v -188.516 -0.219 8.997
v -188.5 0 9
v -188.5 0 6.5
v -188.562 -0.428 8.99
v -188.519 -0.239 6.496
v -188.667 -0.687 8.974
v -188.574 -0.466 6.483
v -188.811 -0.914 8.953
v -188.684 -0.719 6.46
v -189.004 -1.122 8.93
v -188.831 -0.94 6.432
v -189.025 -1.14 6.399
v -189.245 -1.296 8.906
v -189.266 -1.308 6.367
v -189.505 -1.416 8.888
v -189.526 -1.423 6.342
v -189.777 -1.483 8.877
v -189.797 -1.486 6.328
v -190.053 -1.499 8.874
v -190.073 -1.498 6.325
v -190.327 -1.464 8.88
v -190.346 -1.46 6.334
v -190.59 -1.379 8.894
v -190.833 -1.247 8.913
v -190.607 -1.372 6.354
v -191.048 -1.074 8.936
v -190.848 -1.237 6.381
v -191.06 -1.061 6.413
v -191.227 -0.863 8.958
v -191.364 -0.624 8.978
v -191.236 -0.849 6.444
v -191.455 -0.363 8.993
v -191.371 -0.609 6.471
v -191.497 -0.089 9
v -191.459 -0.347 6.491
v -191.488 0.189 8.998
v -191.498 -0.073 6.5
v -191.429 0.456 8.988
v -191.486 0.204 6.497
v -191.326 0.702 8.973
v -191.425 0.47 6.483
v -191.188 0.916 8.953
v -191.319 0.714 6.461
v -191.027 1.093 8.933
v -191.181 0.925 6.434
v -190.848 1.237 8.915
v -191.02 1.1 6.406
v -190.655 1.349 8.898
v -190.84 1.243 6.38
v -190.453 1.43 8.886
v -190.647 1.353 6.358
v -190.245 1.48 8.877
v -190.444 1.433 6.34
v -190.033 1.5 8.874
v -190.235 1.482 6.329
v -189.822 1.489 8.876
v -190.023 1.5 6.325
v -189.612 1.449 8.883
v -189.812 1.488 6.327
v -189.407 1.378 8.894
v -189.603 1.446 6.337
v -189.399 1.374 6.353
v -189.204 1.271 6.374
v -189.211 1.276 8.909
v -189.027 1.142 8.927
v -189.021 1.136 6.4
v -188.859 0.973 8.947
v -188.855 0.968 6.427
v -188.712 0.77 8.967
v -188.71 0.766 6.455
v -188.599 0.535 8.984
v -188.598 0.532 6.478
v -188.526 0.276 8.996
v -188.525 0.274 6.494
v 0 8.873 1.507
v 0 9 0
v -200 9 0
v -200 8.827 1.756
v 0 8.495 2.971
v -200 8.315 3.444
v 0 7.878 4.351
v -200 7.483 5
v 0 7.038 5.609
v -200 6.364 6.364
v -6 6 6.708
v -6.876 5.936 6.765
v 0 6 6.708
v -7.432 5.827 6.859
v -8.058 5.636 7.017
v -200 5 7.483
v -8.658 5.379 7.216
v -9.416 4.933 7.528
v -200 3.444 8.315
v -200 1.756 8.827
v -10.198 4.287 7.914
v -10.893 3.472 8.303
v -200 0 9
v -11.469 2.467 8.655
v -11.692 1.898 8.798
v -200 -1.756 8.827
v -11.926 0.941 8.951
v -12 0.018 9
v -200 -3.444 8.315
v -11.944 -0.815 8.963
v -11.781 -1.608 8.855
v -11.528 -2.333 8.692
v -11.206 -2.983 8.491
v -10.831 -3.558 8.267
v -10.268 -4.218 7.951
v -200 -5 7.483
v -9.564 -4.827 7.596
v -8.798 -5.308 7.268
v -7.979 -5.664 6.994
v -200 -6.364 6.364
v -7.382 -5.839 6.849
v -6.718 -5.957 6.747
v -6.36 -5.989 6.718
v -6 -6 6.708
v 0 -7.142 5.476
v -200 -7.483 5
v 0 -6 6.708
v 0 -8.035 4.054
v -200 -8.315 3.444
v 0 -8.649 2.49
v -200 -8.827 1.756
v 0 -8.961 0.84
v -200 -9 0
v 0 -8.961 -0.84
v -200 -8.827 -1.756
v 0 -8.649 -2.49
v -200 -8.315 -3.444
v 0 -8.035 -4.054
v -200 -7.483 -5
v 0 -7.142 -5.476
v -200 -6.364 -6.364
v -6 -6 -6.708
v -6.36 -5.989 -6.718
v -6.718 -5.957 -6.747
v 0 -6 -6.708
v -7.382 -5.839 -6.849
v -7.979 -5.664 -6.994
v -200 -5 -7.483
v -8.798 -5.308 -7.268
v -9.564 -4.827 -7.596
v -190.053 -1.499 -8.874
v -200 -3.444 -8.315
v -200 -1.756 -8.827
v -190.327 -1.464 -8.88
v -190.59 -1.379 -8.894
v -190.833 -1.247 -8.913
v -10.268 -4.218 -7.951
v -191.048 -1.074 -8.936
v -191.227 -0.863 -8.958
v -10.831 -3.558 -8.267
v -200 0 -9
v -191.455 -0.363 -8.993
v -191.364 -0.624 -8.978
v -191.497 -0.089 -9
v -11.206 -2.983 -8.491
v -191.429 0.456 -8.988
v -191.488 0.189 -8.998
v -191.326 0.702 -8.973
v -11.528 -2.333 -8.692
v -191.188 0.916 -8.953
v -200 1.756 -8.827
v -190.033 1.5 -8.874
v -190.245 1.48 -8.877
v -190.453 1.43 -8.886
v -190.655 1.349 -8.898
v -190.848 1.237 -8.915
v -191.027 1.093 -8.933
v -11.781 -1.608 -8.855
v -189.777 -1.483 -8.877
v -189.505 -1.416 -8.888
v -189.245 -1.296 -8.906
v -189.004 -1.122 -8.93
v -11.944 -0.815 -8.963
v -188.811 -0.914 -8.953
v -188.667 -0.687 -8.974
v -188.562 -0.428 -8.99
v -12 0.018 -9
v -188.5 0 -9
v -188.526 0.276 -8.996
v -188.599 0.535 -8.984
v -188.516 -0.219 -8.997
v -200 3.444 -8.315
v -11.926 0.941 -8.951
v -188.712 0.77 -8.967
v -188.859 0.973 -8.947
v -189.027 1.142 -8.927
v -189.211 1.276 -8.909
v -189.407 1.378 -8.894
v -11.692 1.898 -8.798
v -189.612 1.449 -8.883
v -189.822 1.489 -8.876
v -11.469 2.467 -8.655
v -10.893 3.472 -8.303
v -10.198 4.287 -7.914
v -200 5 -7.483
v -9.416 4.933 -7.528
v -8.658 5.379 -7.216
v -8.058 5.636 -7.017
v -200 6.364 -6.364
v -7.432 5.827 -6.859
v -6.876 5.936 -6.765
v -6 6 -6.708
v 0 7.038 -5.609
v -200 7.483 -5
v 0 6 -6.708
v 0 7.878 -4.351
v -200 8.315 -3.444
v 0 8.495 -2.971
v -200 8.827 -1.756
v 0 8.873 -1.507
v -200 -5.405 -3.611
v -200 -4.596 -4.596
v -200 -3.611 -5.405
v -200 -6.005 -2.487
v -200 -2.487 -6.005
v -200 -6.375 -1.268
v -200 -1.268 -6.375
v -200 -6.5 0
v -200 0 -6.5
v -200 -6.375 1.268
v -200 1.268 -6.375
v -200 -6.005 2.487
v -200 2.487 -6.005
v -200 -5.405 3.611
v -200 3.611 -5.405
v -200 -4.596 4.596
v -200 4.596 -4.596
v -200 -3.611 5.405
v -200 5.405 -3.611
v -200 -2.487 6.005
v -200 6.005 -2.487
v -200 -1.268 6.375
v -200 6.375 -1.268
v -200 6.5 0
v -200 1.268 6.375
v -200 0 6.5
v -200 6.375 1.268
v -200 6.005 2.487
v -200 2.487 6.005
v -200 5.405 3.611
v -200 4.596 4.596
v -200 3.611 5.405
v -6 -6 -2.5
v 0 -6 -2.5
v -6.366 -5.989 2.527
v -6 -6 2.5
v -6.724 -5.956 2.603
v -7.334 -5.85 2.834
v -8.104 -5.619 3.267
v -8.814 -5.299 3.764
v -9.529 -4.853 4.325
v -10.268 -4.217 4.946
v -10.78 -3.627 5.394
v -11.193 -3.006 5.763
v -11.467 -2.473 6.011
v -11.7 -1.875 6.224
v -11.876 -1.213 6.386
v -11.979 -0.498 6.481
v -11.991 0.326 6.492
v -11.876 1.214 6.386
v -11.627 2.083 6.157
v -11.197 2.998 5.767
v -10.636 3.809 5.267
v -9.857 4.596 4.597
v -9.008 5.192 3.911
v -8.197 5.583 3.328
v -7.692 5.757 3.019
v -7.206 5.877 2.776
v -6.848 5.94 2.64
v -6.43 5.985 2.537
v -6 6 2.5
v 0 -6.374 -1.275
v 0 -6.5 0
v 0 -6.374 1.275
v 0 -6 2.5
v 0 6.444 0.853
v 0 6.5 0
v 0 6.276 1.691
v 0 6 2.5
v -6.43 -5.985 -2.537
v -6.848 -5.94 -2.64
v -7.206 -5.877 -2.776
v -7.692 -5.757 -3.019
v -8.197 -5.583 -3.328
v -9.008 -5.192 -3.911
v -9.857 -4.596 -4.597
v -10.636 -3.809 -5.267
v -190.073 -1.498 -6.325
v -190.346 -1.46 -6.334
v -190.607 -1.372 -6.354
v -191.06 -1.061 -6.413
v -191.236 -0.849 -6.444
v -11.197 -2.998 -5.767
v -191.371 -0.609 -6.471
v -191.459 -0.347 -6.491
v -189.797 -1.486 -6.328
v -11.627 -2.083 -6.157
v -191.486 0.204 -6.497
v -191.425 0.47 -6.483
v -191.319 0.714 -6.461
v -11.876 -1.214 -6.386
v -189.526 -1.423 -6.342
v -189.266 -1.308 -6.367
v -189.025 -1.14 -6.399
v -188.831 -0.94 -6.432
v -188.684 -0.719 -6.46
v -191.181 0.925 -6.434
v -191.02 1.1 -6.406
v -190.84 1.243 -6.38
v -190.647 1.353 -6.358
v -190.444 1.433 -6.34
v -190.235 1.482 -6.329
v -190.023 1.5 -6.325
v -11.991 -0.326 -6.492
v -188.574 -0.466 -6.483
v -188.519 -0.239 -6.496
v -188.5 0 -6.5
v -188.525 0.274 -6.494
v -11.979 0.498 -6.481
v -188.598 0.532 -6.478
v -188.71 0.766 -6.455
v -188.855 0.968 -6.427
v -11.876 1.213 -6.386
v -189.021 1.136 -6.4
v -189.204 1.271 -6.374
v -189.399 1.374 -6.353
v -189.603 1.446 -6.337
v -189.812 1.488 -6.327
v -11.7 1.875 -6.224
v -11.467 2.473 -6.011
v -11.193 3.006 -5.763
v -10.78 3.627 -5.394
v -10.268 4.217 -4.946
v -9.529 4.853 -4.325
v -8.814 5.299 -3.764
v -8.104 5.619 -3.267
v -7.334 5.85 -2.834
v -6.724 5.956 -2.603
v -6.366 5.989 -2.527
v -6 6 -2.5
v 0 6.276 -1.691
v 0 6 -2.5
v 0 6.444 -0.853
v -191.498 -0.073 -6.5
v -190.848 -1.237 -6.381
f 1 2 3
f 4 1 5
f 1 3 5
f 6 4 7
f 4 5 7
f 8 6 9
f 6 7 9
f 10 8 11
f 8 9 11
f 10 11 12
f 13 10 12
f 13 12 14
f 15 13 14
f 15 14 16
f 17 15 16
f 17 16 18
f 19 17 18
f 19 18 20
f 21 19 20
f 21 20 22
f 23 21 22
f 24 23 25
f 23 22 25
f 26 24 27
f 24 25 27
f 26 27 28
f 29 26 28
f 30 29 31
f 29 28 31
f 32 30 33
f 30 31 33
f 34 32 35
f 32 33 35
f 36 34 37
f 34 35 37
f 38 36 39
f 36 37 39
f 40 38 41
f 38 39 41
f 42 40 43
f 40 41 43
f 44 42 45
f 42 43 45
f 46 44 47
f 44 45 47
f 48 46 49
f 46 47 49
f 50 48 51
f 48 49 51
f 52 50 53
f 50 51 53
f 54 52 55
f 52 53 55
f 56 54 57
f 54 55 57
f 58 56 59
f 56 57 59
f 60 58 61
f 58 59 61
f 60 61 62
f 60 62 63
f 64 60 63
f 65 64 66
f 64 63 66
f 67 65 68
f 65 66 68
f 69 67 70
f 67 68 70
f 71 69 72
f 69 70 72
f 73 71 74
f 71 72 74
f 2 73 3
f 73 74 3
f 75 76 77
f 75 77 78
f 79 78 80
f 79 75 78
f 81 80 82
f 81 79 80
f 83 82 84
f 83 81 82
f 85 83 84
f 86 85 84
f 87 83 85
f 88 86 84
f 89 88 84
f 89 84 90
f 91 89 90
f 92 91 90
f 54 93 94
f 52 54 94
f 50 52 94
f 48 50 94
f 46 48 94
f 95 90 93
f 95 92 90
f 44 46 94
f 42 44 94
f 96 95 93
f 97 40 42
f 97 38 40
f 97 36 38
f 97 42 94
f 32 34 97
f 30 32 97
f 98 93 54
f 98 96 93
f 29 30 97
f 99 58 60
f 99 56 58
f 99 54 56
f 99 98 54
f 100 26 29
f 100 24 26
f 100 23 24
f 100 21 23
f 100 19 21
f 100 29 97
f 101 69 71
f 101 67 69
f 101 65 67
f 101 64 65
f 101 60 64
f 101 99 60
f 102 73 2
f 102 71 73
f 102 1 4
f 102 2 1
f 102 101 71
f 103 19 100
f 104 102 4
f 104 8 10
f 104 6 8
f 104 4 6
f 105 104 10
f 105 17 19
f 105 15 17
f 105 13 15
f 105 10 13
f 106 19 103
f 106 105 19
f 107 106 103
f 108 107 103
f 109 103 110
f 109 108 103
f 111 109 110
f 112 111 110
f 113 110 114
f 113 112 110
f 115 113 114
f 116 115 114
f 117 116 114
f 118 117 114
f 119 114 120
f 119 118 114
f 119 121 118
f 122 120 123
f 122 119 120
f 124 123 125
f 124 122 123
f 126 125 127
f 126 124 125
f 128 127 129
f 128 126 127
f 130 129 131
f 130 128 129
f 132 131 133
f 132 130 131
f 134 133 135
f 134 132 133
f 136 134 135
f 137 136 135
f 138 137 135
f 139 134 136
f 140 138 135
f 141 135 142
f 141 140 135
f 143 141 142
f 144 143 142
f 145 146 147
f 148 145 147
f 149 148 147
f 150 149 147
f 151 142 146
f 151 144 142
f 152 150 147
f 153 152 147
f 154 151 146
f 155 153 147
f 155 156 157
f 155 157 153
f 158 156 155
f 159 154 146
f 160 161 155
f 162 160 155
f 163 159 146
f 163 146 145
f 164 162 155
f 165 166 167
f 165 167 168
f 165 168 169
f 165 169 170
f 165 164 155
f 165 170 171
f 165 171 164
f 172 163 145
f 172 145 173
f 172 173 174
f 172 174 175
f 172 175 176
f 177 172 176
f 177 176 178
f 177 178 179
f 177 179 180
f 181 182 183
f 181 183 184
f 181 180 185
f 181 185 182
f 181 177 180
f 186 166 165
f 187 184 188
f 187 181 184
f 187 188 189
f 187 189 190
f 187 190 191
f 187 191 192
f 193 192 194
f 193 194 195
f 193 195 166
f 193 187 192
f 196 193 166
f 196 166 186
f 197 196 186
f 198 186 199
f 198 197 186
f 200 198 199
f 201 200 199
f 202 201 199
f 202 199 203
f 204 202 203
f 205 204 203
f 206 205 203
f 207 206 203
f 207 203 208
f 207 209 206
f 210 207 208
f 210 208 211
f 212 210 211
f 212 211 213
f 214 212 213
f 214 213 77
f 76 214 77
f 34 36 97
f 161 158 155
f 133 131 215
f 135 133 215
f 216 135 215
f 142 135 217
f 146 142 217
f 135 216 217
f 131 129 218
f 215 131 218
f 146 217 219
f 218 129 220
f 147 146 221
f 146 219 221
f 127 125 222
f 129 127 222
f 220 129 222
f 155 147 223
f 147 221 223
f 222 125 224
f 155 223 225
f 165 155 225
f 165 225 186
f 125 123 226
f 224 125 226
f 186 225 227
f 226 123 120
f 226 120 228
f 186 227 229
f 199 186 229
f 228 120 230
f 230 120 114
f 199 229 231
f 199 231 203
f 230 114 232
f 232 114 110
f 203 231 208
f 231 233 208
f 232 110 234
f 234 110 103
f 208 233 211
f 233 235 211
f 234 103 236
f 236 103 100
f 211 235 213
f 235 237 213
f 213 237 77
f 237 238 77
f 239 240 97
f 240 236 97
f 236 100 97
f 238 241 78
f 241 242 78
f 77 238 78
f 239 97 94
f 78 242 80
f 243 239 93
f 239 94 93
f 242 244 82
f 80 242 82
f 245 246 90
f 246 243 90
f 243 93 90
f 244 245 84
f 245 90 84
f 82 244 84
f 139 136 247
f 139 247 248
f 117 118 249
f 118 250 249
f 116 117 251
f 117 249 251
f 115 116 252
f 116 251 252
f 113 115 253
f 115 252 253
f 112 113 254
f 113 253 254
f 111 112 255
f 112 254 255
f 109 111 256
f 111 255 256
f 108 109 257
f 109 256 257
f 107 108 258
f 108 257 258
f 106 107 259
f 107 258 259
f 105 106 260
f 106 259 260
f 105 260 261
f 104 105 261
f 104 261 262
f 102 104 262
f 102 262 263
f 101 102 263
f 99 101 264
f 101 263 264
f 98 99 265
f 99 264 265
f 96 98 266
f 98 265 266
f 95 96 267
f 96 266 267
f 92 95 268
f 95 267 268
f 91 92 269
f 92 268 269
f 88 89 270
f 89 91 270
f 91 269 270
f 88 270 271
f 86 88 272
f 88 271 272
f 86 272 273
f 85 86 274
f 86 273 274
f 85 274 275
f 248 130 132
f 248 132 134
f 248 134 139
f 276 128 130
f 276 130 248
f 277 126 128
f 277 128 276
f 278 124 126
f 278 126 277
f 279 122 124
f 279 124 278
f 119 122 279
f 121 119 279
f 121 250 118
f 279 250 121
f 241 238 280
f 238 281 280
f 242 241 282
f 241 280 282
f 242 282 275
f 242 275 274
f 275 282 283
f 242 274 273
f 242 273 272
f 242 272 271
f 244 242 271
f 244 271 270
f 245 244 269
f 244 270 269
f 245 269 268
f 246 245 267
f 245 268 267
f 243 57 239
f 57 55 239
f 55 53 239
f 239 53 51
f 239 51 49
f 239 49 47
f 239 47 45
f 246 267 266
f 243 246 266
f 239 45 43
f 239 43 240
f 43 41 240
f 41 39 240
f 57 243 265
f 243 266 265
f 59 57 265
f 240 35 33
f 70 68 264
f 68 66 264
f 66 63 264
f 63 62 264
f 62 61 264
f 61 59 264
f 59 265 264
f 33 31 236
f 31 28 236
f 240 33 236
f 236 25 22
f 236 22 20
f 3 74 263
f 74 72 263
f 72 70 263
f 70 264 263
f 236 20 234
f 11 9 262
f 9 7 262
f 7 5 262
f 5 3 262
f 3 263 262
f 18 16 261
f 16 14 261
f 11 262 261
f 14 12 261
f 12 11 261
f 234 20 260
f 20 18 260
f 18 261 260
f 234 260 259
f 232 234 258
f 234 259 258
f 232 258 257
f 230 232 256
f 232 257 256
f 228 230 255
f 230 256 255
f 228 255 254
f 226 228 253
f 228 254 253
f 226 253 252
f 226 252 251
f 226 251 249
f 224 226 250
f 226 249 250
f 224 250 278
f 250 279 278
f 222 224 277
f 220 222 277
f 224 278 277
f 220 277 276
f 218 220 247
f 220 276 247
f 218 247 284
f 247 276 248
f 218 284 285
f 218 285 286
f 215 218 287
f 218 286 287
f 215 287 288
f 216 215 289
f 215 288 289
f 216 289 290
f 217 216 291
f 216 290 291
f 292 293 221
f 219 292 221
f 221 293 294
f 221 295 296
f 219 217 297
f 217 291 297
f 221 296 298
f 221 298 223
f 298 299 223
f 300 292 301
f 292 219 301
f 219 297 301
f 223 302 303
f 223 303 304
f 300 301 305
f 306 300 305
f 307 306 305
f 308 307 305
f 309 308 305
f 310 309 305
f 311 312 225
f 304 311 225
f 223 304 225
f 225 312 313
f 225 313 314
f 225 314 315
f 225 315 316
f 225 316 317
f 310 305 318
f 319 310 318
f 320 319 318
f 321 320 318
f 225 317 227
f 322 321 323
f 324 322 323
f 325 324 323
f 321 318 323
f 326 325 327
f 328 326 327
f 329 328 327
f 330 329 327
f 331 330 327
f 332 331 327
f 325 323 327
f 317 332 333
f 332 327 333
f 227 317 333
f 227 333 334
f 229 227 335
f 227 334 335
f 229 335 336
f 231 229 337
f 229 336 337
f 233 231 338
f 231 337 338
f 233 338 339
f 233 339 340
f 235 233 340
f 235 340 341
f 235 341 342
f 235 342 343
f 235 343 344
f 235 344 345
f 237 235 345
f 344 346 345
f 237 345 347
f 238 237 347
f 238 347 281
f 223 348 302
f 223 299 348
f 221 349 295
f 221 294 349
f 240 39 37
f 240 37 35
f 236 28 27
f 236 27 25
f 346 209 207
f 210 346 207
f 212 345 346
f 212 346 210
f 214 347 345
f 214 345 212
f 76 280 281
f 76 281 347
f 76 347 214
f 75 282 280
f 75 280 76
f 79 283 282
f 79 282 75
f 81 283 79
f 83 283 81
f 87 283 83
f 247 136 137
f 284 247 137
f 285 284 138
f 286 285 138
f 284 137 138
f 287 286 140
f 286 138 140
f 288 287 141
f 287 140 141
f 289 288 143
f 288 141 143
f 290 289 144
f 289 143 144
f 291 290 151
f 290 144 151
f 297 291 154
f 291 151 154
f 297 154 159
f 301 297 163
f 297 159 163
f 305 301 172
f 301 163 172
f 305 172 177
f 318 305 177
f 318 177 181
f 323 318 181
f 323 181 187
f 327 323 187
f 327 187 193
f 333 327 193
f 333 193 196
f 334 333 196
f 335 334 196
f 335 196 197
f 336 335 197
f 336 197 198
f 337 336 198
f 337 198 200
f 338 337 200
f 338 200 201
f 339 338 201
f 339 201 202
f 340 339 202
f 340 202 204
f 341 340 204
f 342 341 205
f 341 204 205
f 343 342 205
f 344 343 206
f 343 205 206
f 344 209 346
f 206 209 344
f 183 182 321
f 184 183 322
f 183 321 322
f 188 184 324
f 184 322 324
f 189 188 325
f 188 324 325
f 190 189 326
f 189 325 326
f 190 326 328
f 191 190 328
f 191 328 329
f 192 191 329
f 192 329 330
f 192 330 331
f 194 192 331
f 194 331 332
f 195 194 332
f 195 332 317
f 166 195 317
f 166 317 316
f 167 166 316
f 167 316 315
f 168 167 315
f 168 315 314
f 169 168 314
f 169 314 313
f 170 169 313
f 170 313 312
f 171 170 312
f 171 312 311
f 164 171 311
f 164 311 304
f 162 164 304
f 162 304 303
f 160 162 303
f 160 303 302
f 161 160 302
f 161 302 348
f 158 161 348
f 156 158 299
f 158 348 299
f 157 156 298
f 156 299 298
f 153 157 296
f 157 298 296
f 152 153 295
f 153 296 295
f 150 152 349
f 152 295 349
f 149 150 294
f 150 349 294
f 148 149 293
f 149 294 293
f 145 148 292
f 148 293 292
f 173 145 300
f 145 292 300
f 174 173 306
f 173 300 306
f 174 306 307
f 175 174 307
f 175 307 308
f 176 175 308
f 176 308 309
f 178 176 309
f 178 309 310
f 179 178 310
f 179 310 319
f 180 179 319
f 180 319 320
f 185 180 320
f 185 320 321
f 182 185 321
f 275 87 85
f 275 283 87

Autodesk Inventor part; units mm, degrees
ref_plane "YZ Plane" through (0, 0, 0) normal (1, 0, 0) x (0, 1, 0)
ref_plane "XZ Plane" through (0, 0, 0) normal (0, 1, 0) x (-1, 0, 0)
ref_plane "XY Plane" through (0, 0, 0) normal (0, 0, 1) x (1, 0, 0)
sketch "スケッチ1" plane through (0, 0, 0) normal (1, 0, 0) x (0, 1, 0)
  circle A0 centre (0, 0) radius 9
  circle A1 centre (0, 0) radius 6.5
  dimension "d0" = 18
  dimension "d1" = 13
extrude "押し出し1" add sketch "スケッチ1" against normal blind 200
sketch "スケッチ2" plane through (0, 0, 0) normal (0, 1, 0) x (-1, 0, 0)
  point P0 (0, 0)
sketch "スケッチ3" plane through (0, 0, 0) normal (0, 0, 1) x (1, 0, 0)
  line L0 (0, 0) -> (0, 6)
  line L1 (0, 6.5) -> (0, -6.5) projected
  line L2 (0, 6) -> (-6, 6)
  line L3 (-6, 6) -> (-6, -6)
  line L4 (-6, -6) -> (0, -6)
  line L5 (0, -6) -> (0, 0)
  dimension "d4" = 6
  dimension "d5" = 6
  dimension "d6" = 12
extrude "押し出し2" cut sketch "スケッチ3" along normal mid plane 200
sketch "スケッチ4" plane through (0, 0, 0) normal (0, 0, 1) x (1, 0, 0)
  line L0 (-6, -6) -> (-6, 6) projected
  line L1 (0, 6) -> (-6, 6) projected
  circle A0 centre (-6, 0) radius 6
  point P0 (0, 0)
extrude "押し出し3" cut sketch "スケッチ4" along normal mid plane 200 contours A0 L0 picked at (-9.4508, 1.581)
sketch "スケッチ5" plane through (0, 0, 0) normal (0, 0, 1) x (1, 0, 0)
  circle A0 centre (-190, 0) radius 1.5
  point P0 (0, 0)
  dimension "d11" = 3
extrude "押し出し4" cut sketch "スケッチ5" along normal mid plane 200
thread "ねじ1" size "M3x0.5" class "6H" standard "ANSI Metric M Profile" full length
thread "ねじ2" size "M3x0.5" class "6H" standard "ANSI Metric M Profile" full length
properties part number "vp13_200" material "PVC 配管"
